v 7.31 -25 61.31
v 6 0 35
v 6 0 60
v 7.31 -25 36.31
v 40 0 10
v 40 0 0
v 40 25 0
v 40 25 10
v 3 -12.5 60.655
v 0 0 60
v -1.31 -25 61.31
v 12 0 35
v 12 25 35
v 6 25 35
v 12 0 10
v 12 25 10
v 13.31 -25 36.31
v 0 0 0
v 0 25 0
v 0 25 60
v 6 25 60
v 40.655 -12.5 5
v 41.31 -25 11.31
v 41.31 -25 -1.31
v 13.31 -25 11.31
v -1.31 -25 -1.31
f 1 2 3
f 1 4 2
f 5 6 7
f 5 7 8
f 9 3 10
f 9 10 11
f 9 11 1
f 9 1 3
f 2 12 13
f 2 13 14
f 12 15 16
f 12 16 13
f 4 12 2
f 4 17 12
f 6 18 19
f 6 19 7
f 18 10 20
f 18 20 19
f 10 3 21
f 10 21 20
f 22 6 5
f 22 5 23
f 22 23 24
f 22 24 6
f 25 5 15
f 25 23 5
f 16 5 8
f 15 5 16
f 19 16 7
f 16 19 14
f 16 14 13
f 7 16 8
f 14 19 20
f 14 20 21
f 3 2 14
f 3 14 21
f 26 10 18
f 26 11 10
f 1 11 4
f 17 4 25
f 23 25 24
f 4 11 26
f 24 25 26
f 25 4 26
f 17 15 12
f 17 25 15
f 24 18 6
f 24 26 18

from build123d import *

# Parameters (mm, degrees)
F1_DEPTH      = 25
F1_TAPER      = -3
F1_DEPTH_BACK = 25


with BuildPart() as f1:
    # F0 (on Front) → F1 (new body, two sides)
    with BuildSketch(Plane.XZ) as f1_sk:
        Polygon((0, 60), (0, 0), (40, 0), (40, 10), (12, 10), (12, 35), (6, 35), (6, 60), align=None)
    extrude(amount=F1_DEPTH, taper=F1_TAPER)
    extrude(f1_sk.sketch, amount=-F1_DEPTH_BACK)


solid = f1.part
